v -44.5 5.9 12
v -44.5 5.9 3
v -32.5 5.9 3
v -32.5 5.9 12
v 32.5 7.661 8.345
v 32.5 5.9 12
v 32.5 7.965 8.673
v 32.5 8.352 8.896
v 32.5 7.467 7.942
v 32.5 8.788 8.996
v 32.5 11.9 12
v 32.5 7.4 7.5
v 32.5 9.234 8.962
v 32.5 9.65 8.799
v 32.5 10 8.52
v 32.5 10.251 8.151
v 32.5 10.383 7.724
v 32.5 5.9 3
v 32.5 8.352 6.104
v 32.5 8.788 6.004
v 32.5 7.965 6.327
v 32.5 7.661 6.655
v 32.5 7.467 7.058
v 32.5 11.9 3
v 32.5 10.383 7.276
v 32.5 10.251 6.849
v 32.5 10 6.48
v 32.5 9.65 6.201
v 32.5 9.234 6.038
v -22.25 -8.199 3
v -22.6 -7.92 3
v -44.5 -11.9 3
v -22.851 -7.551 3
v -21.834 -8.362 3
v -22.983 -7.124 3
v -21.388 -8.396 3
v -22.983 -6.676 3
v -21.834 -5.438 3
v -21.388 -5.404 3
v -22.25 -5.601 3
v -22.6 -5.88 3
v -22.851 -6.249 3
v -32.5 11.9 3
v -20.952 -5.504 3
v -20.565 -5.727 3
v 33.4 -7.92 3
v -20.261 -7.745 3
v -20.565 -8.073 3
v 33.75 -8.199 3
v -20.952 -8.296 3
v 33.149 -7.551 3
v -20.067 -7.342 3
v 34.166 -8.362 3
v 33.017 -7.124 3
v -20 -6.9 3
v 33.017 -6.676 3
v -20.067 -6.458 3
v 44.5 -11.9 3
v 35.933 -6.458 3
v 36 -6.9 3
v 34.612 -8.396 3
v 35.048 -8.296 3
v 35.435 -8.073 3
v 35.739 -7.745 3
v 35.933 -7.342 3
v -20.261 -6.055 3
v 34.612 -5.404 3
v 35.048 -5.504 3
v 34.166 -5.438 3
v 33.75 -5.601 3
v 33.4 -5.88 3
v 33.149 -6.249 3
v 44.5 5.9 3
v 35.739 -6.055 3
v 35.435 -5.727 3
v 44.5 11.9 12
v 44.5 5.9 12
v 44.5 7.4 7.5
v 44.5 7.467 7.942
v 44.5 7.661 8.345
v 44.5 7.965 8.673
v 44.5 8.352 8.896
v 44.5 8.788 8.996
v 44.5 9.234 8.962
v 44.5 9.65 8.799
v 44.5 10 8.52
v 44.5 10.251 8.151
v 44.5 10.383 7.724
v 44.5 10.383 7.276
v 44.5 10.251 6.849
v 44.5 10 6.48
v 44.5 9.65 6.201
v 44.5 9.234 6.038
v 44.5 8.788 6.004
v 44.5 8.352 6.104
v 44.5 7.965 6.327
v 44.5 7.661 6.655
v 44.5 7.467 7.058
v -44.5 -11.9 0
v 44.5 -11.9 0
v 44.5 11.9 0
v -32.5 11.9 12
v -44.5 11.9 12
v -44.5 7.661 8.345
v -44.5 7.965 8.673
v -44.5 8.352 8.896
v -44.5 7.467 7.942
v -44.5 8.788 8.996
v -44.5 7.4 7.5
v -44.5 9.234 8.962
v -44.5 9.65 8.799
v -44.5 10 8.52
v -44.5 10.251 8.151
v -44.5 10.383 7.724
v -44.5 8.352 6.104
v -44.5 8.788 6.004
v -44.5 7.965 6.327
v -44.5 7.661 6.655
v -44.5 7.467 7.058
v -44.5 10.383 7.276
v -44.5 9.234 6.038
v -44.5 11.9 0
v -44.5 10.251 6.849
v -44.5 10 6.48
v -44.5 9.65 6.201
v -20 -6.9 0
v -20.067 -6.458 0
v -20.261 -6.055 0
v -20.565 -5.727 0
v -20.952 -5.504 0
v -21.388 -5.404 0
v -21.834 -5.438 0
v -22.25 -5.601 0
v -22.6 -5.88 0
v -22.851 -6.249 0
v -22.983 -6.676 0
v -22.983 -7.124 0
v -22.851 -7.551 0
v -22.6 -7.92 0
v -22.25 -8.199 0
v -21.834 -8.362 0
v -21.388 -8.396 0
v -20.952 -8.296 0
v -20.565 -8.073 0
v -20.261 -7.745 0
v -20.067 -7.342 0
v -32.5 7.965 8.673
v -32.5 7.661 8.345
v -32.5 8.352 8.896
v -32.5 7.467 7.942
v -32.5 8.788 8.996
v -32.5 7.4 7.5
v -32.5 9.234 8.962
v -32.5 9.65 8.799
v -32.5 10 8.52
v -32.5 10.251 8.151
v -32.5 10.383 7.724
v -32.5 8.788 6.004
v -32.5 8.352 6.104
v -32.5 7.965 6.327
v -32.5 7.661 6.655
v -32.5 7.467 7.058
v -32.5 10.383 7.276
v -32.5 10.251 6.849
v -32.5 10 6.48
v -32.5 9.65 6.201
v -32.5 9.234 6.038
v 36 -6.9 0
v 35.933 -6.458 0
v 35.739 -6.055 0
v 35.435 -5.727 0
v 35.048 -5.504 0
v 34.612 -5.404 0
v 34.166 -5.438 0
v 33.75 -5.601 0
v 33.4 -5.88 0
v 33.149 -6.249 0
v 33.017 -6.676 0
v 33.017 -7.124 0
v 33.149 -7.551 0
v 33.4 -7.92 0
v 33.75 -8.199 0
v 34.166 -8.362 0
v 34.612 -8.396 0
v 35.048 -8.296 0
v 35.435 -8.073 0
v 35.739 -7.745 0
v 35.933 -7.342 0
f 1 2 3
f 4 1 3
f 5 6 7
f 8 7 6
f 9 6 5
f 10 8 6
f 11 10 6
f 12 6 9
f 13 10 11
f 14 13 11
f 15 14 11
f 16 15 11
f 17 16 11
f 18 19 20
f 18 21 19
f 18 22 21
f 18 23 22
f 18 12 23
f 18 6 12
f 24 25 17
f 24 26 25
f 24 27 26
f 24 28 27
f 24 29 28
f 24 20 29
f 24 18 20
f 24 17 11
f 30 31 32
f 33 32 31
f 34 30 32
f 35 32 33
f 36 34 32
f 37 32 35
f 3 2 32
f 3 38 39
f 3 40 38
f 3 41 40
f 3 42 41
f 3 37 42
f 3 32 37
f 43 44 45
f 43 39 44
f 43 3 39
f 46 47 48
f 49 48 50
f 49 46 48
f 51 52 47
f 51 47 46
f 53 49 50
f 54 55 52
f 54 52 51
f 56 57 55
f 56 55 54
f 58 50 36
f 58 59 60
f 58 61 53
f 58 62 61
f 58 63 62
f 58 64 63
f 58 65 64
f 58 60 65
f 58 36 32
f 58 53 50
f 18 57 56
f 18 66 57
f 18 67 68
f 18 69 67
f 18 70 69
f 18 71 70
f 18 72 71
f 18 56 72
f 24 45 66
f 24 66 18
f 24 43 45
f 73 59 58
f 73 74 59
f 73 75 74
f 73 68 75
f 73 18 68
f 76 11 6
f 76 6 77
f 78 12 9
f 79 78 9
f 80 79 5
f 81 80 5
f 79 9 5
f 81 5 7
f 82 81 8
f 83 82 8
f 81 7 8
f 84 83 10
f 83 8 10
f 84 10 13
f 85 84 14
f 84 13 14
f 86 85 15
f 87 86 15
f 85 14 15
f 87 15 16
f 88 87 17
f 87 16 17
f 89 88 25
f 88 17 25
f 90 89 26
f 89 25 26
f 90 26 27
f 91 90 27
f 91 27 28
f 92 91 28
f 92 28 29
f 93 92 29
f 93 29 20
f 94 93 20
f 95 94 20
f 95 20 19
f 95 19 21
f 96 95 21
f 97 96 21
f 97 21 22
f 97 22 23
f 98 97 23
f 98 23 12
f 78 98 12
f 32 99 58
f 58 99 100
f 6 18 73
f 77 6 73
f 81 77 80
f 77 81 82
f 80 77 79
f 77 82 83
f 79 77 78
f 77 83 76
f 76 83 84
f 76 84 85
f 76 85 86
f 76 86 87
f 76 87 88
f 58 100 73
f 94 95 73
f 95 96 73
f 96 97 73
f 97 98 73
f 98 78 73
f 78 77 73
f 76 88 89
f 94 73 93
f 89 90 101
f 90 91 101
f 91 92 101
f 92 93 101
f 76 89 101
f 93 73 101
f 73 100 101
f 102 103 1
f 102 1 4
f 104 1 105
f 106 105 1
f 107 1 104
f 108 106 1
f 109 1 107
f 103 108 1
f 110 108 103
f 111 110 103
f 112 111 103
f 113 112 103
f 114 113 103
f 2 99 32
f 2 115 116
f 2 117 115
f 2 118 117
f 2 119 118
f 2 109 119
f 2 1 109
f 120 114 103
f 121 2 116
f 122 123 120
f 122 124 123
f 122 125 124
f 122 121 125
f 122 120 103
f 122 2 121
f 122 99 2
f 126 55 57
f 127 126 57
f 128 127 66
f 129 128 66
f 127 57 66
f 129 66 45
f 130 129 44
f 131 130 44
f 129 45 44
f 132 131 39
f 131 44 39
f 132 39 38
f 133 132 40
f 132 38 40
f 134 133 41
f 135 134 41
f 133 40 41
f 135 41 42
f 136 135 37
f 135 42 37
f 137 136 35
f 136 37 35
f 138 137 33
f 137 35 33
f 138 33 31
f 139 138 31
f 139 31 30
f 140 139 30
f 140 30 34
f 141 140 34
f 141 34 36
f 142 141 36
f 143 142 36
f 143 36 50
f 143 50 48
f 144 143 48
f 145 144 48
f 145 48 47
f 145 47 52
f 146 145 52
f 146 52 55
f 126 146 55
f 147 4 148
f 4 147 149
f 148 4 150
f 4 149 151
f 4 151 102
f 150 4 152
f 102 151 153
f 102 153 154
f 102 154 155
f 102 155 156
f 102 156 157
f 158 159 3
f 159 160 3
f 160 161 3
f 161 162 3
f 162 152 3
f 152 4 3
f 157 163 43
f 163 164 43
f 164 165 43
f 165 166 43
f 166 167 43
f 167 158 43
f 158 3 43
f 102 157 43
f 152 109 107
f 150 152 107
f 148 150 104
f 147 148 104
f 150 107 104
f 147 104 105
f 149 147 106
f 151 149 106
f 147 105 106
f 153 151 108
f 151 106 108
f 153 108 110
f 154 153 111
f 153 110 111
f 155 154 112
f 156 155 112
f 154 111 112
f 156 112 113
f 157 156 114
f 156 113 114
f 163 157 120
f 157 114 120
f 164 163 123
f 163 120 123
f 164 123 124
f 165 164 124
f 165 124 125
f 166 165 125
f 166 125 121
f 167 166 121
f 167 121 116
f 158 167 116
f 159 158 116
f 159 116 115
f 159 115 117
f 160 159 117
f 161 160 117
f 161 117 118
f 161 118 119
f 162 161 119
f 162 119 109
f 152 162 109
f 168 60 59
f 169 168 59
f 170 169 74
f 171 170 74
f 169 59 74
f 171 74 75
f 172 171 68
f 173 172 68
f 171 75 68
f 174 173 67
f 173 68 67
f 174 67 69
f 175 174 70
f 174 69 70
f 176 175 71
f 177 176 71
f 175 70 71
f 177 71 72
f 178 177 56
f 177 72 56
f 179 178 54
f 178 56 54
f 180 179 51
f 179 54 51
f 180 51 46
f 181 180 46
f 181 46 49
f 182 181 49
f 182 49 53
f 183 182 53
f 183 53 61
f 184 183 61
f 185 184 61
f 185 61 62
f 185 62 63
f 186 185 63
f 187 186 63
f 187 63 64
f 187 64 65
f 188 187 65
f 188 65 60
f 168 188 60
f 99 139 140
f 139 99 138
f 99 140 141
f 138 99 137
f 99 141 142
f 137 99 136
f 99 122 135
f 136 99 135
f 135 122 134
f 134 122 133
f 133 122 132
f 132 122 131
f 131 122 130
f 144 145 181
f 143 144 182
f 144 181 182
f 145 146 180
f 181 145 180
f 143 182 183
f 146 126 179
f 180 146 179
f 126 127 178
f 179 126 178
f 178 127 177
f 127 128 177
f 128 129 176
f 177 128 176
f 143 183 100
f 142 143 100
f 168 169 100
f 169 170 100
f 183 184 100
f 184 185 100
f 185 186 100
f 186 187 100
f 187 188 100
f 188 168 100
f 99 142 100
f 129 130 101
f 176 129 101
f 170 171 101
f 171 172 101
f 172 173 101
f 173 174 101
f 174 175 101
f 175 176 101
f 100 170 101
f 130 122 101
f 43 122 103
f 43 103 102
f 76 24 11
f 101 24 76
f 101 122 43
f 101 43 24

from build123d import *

# Parameters (mm, degrees)
F0_W     = 89
F0_H     = 23.8
F1_DEPTH = 3
F2_W     = 12
F2_H     = 6
F3_W     = 12
F3_H     = 6
F4_DEPTH = 9
F5_R     = 1.5
F6_DEPTH = 89.001
F7_R     = 1.5
F8_R     = 1.5
F9_DEPTH = 15


with BuildPart() as f1:
    # F0 (on Top) → F1 (new body)
    with BuildSketch(Plane.XY):
        Rectangle(F0_W, F0_H)
    extrude(amount=F1_DEPTH)

    # F2 (on face) + F3 (on face) → F4 (join)
    with BuildSketch(Plane.XY.offset(3)):
        with Locations((38.5, 8.9)):
            Rectangle(F2_W, F2_H)
    with BuildSketch(Plane.XY.offset(3)):
        with Locations((-38.5, 8.9)):
            Rectangle(F3_W, F3_H)
    extrude(amount=F4_DEPTH)

    # F5 (on face) → F6 (cut, through all)
    with BuildSketch(Plane(origin=(-44.5, 0, 0), x_dir=(0, -1, 0), z_dir=(-1, 0, 0))):
        with Locations((-8.9, 7.5)):
            Circle(F5_R)
    extrude(amount=-F6_DEPTH, mode=Mode.SUBTRACT)

    # F7 (on face) + F8 (on face) → F9 (cut)
    with BuildSketch(Plane.XY.offset(3)):
        with Locations((34.5, -6.9)):
            Circle(F7_R)
    with BuildSketch(Plane.XY.offset(3)):
        with Locations((-21.5, -6.9)):
            Circle(F8_R)
    extrude(amount=-F9_DEPTH, mode=Mode.SUBTRACT)


solid = f1.part
